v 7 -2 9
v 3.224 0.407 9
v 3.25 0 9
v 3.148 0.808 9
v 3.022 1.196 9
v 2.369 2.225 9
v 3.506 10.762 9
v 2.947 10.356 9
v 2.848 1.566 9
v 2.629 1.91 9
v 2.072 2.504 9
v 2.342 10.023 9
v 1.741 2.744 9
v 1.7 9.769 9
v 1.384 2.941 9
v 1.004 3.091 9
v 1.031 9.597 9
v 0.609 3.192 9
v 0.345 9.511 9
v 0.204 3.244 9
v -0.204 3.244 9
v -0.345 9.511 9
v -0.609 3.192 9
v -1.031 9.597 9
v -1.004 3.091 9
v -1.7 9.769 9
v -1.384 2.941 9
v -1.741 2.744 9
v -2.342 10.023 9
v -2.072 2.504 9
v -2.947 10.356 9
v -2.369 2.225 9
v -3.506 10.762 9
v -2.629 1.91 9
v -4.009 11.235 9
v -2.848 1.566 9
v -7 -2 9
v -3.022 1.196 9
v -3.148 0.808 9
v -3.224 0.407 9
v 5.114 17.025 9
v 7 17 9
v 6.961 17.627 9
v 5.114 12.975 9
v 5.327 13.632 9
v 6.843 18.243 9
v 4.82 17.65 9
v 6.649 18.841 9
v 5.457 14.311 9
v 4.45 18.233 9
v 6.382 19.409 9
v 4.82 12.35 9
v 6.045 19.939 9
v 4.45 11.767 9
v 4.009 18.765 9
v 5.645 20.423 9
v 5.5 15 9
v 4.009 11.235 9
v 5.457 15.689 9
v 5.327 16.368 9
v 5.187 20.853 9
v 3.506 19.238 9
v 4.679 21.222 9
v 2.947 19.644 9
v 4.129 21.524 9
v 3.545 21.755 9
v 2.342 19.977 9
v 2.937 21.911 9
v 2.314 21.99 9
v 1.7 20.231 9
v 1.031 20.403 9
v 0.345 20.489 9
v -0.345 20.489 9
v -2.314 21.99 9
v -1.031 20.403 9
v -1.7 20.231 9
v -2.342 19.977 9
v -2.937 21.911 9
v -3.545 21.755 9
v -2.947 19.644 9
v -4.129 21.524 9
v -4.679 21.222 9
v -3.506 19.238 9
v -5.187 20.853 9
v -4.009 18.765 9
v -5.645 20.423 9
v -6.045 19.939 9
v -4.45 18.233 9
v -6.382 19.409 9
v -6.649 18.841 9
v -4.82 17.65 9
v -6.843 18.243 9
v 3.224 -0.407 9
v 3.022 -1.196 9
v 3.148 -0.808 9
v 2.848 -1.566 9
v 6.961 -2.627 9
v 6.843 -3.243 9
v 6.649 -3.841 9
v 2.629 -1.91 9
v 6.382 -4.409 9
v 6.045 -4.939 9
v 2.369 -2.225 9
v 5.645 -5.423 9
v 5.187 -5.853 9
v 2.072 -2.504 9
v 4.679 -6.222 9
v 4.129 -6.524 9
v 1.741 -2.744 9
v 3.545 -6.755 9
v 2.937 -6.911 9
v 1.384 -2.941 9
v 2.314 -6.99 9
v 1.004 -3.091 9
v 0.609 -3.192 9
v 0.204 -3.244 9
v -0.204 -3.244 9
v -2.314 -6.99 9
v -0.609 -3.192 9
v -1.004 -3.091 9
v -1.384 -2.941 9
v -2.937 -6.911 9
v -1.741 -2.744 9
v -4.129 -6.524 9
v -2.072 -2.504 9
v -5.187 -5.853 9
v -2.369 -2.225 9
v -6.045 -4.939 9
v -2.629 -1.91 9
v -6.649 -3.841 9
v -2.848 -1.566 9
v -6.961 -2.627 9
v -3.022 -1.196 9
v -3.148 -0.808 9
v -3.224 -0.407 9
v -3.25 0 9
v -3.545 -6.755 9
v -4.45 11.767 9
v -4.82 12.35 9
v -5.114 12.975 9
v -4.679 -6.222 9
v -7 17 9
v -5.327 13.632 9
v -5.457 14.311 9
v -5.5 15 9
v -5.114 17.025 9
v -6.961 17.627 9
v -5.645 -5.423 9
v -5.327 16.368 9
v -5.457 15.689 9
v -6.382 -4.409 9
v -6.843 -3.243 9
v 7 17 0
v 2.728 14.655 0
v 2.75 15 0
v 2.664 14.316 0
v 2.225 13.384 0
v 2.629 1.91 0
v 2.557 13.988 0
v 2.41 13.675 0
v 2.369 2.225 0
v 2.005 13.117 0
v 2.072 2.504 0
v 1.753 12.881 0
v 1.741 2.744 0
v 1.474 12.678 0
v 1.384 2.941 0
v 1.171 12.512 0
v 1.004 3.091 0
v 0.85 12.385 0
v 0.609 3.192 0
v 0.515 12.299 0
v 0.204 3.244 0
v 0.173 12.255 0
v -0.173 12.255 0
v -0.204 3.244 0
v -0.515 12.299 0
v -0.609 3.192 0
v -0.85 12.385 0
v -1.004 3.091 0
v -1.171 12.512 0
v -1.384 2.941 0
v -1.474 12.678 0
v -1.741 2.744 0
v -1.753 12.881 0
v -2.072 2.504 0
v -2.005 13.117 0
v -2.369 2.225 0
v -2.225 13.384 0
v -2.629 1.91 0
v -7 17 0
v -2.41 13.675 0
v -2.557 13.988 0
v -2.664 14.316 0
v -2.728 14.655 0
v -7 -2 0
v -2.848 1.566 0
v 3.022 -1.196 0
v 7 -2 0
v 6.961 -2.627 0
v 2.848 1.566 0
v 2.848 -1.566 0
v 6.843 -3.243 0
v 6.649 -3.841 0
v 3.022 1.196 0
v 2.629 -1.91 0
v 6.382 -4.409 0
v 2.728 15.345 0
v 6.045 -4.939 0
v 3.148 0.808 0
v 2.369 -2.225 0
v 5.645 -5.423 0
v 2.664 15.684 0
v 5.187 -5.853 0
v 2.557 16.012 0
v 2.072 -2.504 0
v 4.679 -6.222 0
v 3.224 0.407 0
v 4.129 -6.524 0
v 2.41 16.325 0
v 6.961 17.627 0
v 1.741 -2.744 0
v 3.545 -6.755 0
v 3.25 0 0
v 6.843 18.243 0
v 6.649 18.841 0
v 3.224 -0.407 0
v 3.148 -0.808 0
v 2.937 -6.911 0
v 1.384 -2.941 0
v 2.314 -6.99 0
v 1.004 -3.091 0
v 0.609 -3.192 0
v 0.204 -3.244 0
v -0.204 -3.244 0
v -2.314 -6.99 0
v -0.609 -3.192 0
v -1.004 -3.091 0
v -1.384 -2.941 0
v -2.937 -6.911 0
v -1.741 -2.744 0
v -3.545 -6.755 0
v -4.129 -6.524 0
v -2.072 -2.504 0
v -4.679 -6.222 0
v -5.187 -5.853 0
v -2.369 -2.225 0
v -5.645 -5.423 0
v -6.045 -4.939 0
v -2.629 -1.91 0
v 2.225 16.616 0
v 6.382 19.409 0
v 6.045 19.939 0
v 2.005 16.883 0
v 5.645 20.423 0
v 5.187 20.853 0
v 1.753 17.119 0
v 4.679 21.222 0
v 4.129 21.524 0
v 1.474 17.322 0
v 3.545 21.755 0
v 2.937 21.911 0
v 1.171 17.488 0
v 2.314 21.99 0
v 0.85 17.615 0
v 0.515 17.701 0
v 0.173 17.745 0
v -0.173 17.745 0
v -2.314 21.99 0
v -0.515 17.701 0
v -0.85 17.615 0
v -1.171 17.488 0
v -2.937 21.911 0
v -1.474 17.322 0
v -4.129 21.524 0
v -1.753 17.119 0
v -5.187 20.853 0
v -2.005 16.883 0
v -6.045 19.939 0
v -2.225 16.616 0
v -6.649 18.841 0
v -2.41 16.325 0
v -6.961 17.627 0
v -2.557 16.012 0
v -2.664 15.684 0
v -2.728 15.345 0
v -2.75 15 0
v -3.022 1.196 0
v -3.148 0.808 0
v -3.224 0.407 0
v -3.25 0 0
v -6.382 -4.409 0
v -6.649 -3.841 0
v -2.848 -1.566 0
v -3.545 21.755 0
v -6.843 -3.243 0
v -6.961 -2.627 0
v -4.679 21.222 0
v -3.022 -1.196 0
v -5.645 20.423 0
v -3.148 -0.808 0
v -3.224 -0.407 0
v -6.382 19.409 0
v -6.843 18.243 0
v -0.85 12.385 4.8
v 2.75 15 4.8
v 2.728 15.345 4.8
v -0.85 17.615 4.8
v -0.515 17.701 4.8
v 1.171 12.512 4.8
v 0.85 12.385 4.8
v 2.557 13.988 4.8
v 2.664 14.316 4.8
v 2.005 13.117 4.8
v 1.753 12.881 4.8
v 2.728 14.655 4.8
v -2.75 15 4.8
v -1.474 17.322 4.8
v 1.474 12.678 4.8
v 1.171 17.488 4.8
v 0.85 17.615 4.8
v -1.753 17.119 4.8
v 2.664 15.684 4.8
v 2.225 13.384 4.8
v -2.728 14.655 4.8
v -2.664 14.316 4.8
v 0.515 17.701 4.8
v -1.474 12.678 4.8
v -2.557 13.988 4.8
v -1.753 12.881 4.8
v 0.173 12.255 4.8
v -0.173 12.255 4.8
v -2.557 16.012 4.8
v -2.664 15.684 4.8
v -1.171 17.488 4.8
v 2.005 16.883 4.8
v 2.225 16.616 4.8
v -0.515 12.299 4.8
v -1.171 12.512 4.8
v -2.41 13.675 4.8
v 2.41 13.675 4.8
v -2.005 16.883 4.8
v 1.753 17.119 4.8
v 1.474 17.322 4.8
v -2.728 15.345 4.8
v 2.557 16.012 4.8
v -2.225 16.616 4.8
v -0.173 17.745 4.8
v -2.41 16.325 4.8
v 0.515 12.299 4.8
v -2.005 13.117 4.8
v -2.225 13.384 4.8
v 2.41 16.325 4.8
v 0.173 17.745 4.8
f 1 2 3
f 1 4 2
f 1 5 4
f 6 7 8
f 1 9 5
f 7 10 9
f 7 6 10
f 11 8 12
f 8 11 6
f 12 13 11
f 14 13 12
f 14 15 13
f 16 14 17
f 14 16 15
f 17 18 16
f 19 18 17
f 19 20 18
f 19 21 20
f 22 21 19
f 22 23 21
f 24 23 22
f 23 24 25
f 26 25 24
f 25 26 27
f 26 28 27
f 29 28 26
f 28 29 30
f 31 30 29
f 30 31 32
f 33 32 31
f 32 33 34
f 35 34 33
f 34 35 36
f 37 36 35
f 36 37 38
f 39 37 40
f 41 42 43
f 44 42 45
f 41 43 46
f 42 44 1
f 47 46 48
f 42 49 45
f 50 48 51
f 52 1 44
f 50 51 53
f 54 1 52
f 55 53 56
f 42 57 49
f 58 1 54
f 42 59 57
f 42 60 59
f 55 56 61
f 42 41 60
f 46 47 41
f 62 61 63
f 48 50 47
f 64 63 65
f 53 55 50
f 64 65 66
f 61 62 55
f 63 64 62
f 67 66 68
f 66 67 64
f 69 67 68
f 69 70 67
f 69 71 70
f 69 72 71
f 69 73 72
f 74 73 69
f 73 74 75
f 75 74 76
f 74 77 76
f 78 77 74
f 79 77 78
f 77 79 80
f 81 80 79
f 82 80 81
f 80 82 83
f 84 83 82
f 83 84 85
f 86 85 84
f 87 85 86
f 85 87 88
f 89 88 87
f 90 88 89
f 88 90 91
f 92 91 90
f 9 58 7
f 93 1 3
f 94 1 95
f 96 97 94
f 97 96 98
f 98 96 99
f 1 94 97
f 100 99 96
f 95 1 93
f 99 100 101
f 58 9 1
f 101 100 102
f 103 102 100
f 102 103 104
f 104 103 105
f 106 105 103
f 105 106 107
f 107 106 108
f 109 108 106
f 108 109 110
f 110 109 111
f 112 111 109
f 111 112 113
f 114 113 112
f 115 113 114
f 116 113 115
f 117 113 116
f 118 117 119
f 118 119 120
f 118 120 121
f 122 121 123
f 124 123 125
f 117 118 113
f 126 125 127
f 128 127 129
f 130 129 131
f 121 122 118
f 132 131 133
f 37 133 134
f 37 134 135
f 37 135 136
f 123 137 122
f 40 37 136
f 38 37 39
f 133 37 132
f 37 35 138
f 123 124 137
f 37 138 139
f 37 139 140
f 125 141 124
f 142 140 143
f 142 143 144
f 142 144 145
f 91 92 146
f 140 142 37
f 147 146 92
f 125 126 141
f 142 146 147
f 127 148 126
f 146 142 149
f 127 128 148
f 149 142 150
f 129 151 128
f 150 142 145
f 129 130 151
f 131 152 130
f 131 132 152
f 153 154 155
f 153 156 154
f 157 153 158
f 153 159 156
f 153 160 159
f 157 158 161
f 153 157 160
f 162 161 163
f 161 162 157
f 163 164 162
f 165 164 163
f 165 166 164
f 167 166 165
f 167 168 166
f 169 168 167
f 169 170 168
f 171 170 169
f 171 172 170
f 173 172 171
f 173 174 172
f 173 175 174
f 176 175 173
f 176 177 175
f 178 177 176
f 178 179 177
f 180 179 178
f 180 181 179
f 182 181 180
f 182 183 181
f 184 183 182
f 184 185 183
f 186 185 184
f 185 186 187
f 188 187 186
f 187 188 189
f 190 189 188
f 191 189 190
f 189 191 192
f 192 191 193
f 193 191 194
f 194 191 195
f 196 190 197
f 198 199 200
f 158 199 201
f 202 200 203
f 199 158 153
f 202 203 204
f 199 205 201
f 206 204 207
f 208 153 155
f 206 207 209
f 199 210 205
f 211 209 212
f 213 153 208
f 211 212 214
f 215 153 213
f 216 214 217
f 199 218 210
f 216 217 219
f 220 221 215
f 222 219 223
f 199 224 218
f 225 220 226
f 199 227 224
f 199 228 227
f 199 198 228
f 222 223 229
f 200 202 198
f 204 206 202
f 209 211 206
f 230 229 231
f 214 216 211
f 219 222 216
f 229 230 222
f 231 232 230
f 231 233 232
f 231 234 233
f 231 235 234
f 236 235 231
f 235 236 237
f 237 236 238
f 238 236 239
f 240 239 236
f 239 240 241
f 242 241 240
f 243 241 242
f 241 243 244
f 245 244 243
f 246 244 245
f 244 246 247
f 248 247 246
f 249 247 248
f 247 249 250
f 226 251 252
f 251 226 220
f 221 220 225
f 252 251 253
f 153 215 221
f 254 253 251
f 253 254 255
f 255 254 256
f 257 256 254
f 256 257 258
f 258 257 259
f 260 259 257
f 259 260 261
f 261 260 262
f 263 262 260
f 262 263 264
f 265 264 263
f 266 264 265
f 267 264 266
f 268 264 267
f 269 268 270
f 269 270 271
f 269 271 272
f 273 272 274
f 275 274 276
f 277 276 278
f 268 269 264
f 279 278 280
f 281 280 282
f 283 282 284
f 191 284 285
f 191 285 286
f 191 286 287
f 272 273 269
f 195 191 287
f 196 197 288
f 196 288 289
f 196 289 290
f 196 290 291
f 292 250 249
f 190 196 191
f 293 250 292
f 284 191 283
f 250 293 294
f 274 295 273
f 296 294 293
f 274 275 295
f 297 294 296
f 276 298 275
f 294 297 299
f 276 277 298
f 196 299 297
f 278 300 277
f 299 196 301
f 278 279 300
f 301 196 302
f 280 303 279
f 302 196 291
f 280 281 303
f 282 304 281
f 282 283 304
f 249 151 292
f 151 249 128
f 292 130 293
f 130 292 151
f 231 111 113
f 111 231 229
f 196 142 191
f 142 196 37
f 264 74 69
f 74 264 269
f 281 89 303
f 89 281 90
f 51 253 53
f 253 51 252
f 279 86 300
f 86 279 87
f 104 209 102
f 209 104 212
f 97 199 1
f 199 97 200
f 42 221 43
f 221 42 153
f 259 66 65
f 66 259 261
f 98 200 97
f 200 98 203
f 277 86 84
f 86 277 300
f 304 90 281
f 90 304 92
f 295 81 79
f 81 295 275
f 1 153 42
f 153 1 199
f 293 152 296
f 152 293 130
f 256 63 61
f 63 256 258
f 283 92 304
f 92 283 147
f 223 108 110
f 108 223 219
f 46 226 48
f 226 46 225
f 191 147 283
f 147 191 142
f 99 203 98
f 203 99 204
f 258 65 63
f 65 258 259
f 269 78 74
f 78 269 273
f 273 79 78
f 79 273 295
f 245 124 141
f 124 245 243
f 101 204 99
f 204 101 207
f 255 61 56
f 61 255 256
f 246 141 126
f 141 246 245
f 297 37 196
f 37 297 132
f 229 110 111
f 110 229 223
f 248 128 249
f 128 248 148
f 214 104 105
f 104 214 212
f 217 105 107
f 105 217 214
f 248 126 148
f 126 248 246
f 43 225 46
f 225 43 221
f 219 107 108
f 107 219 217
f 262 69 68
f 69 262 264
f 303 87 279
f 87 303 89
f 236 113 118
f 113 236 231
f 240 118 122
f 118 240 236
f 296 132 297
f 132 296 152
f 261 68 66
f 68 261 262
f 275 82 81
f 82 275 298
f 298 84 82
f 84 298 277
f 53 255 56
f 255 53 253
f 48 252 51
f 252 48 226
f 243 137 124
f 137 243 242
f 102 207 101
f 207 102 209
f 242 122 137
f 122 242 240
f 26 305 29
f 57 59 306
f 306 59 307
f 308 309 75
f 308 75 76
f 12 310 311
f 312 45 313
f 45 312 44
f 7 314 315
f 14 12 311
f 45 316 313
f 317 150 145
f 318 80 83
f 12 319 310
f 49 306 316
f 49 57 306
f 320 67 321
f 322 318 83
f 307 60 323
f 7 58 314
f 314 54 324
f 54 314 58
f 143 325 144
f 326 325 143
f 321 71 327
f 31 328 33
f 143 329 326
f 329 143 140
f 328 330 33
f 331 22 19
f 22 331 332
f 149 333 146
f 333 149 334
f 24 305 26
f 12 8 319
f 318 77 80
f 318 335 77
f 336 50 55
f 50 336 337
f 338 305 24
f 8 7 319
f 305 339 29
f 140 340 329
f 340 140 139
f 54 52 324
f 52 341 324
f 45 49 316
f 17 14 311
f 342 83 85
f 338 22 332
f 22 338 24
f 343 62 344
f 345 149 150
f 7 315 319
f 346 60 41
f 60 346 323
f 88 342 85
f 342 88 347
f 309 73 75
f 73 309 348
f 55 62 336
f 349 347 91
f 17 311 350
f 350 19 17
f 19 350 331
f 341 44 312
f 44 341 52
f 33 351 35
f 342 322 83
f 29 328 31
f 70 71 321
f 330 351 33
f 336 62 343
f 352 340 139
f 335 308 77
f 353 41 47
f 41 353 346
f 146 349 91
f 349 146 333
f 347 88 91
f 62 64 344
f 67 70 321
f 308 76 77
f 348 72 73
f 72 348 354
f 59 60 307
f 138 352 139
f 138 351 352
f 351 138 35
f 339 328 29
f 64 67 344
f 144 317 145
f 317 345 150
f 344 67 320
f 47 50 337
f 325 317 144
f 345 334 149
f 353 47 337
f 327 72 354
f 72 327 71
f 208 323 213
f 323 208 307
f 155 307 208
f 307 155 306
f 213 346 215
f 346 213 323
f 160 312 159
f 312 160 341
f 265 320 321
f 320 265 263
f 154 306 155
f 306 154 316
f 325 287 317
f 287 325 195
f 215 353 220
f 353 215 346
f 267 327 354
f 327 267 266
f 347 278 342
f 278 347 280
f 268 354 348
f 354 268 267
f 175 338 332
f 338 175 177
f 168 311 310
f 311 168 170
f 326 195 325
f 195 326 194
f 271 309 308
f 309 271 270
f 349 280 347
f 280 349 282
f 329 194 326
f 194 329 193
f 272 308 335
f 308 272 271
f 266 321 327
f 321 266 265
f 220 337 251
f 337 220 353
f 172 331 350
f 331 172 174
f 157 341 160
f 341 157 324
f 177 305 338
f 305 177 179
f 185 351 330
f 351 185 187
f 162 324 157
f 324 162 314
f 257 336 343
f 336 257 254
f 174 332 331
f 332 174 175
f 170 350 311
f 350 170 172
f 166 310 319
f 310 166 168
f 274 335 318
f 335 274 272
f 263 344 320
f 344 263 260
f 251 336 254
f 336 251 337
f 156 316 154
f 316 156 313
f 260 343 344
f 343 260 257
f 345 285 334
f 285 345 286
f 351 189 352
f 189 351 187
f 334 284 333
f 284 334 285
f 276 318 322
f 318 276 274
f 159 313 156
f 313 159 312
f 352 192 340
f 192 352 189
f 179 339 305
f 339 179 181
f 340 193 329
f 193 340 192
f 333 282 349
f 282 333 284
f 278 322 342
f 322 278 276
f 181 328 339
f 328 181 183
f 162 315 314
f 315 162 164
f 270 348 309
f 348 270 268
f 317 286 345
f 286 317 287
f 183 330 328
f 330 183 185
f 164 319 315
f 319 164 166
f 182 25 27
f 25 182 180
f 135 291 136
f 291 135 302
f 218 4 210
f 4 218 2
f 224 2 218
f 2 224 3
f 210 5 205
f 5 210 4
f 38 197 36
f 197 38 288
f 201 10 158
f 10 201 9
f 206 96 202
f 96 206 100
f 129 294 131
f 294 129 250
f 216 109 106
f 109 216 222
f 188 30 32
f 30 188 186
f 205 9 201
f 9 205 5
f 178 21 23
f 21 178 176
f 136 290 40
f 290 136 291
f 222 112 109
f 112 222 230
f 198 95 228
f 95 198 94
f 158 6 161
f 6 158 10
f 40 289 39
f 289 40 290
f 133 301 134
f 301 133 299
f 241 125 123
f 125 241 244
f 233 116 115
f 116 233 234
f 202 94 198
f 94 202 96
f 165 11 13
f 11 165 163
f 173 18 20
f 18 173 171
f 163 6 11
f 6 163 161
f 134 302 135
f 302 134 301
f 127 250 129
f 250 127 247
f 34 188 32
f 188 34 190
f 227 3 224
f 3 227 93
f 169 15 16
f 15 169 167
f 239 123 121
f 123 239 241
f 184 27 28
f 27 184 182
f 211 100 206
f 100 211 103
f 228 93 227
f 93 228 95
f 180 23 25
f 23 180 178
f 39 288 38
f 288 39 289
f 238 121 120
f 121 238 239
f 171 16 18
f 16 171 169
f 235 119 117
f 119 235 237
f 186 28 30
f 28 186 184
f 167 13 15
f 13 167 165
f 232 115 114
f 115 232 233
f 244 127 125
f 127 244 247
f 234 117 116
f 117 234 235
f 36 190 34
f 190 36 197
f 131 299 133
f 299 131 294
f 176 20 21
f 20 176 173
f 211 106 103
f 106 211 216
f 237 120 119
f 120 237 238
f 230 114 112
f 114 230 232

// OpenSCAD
$fn = 50;


difference() {
	union() {
		cylinder(h = 9, r = 7.0000000000);
		translate(v = [0.0000000000, 7.5000000000, 0]) {
			hull() {
				translate(v = [-2.0000000000, 9.5000000000, 0]) {
					cylinder(h = 9, r = 5);
				}
				translate(v = [2.0000000000, 9.5000000000, 0]) {
					cylinder(h = 9, r = 5);
				}
				translate(v = [-2.0000000000, -9.5000000000, 0]) {
					cylinder(h = 9, r = 5);
				}
				translate(v = [2.0000000000, -9.5000000000, 0]) {
					cylinder(h = 9, r = 5);
				}
			}
		}
		translate(v = [0.0000000000, 7.5000000000, 0]) {
			hull() {
				translate(v = [-2.0000000000, 9.5000000000, 0]) {
					cylinder(h = 9, r = 5);
				}
				translate(v = [2.0000000000, 9.5000000000, 0]) {
					cylinder(h = 9, r = 5);
				}
				translate(v = [-2.0000000000, -9.5000000000, 0]) {
					cylinder(h = 9, r = 5);
				}
				translate(v = [2.0000000000, -9.5000000000, 0]) {
					cylinder(h = 9, r = 5);
				}
			}
		}
	}
	union() {
		translate(v = [0.0000000000, 15.0000000000, 9]) {
			rotate(a = [0, 0, 0]) {
				difference() {
					union() {
						#translate(v = [0, 0, -9.0000000000]) {
							cylinder(h = 9, r = 2.2500000000);
						}
						#translate(v = [0, 0, -4.2000000000]) {
							cylinder(h = 4.2000000000, r1 = 2.7500000000, r2 = 5.5000000000);
						}
						#translate(v = [0, 0, -9.0000000000]) {
							cylinder(h = 9, r = 2.7500000000);
						}
						#translate(v = [0, 0, -9.0000000000]) {
							cylinder(h = 9, r = 2.2500000000);
						}
					}
					union();
				}
			}
		}
		translate(v = [0.0000000000, 15.0000000000, 9]) {
			rotate(a = [0, 0, 0]) {
				difference() {
					union() {
						#translate(v = [0, 0, -9.0000000000]) {
							cylinder(h = 9, r = 2.2500000000);
						}
						#translate(v = [0, 0, -4.2000000000]) {
							cylinder(h = 4.2000000000, r1 = 2.7500000000, r2 = 5.5000000000);
						}
						#translate(v = [0, 0, -9.0000000000]) {
							cylinder(h = 9, r = 2.7500000000);
						}
						#translate(v = [0, 0, -9.0000000000]) {
							cylinder(h = 9, r = 2.2500000000);
						}
					}
					union();
				}
			}
		}
		translate(v = [0, 0, -100]) {
			cylinder(h = 200, r = 3.2500000000);
		}
		translate(v = [0, 0, -100]) {
			cylinder(h = 200, r = 1.8000000000);
		}
	}
}
